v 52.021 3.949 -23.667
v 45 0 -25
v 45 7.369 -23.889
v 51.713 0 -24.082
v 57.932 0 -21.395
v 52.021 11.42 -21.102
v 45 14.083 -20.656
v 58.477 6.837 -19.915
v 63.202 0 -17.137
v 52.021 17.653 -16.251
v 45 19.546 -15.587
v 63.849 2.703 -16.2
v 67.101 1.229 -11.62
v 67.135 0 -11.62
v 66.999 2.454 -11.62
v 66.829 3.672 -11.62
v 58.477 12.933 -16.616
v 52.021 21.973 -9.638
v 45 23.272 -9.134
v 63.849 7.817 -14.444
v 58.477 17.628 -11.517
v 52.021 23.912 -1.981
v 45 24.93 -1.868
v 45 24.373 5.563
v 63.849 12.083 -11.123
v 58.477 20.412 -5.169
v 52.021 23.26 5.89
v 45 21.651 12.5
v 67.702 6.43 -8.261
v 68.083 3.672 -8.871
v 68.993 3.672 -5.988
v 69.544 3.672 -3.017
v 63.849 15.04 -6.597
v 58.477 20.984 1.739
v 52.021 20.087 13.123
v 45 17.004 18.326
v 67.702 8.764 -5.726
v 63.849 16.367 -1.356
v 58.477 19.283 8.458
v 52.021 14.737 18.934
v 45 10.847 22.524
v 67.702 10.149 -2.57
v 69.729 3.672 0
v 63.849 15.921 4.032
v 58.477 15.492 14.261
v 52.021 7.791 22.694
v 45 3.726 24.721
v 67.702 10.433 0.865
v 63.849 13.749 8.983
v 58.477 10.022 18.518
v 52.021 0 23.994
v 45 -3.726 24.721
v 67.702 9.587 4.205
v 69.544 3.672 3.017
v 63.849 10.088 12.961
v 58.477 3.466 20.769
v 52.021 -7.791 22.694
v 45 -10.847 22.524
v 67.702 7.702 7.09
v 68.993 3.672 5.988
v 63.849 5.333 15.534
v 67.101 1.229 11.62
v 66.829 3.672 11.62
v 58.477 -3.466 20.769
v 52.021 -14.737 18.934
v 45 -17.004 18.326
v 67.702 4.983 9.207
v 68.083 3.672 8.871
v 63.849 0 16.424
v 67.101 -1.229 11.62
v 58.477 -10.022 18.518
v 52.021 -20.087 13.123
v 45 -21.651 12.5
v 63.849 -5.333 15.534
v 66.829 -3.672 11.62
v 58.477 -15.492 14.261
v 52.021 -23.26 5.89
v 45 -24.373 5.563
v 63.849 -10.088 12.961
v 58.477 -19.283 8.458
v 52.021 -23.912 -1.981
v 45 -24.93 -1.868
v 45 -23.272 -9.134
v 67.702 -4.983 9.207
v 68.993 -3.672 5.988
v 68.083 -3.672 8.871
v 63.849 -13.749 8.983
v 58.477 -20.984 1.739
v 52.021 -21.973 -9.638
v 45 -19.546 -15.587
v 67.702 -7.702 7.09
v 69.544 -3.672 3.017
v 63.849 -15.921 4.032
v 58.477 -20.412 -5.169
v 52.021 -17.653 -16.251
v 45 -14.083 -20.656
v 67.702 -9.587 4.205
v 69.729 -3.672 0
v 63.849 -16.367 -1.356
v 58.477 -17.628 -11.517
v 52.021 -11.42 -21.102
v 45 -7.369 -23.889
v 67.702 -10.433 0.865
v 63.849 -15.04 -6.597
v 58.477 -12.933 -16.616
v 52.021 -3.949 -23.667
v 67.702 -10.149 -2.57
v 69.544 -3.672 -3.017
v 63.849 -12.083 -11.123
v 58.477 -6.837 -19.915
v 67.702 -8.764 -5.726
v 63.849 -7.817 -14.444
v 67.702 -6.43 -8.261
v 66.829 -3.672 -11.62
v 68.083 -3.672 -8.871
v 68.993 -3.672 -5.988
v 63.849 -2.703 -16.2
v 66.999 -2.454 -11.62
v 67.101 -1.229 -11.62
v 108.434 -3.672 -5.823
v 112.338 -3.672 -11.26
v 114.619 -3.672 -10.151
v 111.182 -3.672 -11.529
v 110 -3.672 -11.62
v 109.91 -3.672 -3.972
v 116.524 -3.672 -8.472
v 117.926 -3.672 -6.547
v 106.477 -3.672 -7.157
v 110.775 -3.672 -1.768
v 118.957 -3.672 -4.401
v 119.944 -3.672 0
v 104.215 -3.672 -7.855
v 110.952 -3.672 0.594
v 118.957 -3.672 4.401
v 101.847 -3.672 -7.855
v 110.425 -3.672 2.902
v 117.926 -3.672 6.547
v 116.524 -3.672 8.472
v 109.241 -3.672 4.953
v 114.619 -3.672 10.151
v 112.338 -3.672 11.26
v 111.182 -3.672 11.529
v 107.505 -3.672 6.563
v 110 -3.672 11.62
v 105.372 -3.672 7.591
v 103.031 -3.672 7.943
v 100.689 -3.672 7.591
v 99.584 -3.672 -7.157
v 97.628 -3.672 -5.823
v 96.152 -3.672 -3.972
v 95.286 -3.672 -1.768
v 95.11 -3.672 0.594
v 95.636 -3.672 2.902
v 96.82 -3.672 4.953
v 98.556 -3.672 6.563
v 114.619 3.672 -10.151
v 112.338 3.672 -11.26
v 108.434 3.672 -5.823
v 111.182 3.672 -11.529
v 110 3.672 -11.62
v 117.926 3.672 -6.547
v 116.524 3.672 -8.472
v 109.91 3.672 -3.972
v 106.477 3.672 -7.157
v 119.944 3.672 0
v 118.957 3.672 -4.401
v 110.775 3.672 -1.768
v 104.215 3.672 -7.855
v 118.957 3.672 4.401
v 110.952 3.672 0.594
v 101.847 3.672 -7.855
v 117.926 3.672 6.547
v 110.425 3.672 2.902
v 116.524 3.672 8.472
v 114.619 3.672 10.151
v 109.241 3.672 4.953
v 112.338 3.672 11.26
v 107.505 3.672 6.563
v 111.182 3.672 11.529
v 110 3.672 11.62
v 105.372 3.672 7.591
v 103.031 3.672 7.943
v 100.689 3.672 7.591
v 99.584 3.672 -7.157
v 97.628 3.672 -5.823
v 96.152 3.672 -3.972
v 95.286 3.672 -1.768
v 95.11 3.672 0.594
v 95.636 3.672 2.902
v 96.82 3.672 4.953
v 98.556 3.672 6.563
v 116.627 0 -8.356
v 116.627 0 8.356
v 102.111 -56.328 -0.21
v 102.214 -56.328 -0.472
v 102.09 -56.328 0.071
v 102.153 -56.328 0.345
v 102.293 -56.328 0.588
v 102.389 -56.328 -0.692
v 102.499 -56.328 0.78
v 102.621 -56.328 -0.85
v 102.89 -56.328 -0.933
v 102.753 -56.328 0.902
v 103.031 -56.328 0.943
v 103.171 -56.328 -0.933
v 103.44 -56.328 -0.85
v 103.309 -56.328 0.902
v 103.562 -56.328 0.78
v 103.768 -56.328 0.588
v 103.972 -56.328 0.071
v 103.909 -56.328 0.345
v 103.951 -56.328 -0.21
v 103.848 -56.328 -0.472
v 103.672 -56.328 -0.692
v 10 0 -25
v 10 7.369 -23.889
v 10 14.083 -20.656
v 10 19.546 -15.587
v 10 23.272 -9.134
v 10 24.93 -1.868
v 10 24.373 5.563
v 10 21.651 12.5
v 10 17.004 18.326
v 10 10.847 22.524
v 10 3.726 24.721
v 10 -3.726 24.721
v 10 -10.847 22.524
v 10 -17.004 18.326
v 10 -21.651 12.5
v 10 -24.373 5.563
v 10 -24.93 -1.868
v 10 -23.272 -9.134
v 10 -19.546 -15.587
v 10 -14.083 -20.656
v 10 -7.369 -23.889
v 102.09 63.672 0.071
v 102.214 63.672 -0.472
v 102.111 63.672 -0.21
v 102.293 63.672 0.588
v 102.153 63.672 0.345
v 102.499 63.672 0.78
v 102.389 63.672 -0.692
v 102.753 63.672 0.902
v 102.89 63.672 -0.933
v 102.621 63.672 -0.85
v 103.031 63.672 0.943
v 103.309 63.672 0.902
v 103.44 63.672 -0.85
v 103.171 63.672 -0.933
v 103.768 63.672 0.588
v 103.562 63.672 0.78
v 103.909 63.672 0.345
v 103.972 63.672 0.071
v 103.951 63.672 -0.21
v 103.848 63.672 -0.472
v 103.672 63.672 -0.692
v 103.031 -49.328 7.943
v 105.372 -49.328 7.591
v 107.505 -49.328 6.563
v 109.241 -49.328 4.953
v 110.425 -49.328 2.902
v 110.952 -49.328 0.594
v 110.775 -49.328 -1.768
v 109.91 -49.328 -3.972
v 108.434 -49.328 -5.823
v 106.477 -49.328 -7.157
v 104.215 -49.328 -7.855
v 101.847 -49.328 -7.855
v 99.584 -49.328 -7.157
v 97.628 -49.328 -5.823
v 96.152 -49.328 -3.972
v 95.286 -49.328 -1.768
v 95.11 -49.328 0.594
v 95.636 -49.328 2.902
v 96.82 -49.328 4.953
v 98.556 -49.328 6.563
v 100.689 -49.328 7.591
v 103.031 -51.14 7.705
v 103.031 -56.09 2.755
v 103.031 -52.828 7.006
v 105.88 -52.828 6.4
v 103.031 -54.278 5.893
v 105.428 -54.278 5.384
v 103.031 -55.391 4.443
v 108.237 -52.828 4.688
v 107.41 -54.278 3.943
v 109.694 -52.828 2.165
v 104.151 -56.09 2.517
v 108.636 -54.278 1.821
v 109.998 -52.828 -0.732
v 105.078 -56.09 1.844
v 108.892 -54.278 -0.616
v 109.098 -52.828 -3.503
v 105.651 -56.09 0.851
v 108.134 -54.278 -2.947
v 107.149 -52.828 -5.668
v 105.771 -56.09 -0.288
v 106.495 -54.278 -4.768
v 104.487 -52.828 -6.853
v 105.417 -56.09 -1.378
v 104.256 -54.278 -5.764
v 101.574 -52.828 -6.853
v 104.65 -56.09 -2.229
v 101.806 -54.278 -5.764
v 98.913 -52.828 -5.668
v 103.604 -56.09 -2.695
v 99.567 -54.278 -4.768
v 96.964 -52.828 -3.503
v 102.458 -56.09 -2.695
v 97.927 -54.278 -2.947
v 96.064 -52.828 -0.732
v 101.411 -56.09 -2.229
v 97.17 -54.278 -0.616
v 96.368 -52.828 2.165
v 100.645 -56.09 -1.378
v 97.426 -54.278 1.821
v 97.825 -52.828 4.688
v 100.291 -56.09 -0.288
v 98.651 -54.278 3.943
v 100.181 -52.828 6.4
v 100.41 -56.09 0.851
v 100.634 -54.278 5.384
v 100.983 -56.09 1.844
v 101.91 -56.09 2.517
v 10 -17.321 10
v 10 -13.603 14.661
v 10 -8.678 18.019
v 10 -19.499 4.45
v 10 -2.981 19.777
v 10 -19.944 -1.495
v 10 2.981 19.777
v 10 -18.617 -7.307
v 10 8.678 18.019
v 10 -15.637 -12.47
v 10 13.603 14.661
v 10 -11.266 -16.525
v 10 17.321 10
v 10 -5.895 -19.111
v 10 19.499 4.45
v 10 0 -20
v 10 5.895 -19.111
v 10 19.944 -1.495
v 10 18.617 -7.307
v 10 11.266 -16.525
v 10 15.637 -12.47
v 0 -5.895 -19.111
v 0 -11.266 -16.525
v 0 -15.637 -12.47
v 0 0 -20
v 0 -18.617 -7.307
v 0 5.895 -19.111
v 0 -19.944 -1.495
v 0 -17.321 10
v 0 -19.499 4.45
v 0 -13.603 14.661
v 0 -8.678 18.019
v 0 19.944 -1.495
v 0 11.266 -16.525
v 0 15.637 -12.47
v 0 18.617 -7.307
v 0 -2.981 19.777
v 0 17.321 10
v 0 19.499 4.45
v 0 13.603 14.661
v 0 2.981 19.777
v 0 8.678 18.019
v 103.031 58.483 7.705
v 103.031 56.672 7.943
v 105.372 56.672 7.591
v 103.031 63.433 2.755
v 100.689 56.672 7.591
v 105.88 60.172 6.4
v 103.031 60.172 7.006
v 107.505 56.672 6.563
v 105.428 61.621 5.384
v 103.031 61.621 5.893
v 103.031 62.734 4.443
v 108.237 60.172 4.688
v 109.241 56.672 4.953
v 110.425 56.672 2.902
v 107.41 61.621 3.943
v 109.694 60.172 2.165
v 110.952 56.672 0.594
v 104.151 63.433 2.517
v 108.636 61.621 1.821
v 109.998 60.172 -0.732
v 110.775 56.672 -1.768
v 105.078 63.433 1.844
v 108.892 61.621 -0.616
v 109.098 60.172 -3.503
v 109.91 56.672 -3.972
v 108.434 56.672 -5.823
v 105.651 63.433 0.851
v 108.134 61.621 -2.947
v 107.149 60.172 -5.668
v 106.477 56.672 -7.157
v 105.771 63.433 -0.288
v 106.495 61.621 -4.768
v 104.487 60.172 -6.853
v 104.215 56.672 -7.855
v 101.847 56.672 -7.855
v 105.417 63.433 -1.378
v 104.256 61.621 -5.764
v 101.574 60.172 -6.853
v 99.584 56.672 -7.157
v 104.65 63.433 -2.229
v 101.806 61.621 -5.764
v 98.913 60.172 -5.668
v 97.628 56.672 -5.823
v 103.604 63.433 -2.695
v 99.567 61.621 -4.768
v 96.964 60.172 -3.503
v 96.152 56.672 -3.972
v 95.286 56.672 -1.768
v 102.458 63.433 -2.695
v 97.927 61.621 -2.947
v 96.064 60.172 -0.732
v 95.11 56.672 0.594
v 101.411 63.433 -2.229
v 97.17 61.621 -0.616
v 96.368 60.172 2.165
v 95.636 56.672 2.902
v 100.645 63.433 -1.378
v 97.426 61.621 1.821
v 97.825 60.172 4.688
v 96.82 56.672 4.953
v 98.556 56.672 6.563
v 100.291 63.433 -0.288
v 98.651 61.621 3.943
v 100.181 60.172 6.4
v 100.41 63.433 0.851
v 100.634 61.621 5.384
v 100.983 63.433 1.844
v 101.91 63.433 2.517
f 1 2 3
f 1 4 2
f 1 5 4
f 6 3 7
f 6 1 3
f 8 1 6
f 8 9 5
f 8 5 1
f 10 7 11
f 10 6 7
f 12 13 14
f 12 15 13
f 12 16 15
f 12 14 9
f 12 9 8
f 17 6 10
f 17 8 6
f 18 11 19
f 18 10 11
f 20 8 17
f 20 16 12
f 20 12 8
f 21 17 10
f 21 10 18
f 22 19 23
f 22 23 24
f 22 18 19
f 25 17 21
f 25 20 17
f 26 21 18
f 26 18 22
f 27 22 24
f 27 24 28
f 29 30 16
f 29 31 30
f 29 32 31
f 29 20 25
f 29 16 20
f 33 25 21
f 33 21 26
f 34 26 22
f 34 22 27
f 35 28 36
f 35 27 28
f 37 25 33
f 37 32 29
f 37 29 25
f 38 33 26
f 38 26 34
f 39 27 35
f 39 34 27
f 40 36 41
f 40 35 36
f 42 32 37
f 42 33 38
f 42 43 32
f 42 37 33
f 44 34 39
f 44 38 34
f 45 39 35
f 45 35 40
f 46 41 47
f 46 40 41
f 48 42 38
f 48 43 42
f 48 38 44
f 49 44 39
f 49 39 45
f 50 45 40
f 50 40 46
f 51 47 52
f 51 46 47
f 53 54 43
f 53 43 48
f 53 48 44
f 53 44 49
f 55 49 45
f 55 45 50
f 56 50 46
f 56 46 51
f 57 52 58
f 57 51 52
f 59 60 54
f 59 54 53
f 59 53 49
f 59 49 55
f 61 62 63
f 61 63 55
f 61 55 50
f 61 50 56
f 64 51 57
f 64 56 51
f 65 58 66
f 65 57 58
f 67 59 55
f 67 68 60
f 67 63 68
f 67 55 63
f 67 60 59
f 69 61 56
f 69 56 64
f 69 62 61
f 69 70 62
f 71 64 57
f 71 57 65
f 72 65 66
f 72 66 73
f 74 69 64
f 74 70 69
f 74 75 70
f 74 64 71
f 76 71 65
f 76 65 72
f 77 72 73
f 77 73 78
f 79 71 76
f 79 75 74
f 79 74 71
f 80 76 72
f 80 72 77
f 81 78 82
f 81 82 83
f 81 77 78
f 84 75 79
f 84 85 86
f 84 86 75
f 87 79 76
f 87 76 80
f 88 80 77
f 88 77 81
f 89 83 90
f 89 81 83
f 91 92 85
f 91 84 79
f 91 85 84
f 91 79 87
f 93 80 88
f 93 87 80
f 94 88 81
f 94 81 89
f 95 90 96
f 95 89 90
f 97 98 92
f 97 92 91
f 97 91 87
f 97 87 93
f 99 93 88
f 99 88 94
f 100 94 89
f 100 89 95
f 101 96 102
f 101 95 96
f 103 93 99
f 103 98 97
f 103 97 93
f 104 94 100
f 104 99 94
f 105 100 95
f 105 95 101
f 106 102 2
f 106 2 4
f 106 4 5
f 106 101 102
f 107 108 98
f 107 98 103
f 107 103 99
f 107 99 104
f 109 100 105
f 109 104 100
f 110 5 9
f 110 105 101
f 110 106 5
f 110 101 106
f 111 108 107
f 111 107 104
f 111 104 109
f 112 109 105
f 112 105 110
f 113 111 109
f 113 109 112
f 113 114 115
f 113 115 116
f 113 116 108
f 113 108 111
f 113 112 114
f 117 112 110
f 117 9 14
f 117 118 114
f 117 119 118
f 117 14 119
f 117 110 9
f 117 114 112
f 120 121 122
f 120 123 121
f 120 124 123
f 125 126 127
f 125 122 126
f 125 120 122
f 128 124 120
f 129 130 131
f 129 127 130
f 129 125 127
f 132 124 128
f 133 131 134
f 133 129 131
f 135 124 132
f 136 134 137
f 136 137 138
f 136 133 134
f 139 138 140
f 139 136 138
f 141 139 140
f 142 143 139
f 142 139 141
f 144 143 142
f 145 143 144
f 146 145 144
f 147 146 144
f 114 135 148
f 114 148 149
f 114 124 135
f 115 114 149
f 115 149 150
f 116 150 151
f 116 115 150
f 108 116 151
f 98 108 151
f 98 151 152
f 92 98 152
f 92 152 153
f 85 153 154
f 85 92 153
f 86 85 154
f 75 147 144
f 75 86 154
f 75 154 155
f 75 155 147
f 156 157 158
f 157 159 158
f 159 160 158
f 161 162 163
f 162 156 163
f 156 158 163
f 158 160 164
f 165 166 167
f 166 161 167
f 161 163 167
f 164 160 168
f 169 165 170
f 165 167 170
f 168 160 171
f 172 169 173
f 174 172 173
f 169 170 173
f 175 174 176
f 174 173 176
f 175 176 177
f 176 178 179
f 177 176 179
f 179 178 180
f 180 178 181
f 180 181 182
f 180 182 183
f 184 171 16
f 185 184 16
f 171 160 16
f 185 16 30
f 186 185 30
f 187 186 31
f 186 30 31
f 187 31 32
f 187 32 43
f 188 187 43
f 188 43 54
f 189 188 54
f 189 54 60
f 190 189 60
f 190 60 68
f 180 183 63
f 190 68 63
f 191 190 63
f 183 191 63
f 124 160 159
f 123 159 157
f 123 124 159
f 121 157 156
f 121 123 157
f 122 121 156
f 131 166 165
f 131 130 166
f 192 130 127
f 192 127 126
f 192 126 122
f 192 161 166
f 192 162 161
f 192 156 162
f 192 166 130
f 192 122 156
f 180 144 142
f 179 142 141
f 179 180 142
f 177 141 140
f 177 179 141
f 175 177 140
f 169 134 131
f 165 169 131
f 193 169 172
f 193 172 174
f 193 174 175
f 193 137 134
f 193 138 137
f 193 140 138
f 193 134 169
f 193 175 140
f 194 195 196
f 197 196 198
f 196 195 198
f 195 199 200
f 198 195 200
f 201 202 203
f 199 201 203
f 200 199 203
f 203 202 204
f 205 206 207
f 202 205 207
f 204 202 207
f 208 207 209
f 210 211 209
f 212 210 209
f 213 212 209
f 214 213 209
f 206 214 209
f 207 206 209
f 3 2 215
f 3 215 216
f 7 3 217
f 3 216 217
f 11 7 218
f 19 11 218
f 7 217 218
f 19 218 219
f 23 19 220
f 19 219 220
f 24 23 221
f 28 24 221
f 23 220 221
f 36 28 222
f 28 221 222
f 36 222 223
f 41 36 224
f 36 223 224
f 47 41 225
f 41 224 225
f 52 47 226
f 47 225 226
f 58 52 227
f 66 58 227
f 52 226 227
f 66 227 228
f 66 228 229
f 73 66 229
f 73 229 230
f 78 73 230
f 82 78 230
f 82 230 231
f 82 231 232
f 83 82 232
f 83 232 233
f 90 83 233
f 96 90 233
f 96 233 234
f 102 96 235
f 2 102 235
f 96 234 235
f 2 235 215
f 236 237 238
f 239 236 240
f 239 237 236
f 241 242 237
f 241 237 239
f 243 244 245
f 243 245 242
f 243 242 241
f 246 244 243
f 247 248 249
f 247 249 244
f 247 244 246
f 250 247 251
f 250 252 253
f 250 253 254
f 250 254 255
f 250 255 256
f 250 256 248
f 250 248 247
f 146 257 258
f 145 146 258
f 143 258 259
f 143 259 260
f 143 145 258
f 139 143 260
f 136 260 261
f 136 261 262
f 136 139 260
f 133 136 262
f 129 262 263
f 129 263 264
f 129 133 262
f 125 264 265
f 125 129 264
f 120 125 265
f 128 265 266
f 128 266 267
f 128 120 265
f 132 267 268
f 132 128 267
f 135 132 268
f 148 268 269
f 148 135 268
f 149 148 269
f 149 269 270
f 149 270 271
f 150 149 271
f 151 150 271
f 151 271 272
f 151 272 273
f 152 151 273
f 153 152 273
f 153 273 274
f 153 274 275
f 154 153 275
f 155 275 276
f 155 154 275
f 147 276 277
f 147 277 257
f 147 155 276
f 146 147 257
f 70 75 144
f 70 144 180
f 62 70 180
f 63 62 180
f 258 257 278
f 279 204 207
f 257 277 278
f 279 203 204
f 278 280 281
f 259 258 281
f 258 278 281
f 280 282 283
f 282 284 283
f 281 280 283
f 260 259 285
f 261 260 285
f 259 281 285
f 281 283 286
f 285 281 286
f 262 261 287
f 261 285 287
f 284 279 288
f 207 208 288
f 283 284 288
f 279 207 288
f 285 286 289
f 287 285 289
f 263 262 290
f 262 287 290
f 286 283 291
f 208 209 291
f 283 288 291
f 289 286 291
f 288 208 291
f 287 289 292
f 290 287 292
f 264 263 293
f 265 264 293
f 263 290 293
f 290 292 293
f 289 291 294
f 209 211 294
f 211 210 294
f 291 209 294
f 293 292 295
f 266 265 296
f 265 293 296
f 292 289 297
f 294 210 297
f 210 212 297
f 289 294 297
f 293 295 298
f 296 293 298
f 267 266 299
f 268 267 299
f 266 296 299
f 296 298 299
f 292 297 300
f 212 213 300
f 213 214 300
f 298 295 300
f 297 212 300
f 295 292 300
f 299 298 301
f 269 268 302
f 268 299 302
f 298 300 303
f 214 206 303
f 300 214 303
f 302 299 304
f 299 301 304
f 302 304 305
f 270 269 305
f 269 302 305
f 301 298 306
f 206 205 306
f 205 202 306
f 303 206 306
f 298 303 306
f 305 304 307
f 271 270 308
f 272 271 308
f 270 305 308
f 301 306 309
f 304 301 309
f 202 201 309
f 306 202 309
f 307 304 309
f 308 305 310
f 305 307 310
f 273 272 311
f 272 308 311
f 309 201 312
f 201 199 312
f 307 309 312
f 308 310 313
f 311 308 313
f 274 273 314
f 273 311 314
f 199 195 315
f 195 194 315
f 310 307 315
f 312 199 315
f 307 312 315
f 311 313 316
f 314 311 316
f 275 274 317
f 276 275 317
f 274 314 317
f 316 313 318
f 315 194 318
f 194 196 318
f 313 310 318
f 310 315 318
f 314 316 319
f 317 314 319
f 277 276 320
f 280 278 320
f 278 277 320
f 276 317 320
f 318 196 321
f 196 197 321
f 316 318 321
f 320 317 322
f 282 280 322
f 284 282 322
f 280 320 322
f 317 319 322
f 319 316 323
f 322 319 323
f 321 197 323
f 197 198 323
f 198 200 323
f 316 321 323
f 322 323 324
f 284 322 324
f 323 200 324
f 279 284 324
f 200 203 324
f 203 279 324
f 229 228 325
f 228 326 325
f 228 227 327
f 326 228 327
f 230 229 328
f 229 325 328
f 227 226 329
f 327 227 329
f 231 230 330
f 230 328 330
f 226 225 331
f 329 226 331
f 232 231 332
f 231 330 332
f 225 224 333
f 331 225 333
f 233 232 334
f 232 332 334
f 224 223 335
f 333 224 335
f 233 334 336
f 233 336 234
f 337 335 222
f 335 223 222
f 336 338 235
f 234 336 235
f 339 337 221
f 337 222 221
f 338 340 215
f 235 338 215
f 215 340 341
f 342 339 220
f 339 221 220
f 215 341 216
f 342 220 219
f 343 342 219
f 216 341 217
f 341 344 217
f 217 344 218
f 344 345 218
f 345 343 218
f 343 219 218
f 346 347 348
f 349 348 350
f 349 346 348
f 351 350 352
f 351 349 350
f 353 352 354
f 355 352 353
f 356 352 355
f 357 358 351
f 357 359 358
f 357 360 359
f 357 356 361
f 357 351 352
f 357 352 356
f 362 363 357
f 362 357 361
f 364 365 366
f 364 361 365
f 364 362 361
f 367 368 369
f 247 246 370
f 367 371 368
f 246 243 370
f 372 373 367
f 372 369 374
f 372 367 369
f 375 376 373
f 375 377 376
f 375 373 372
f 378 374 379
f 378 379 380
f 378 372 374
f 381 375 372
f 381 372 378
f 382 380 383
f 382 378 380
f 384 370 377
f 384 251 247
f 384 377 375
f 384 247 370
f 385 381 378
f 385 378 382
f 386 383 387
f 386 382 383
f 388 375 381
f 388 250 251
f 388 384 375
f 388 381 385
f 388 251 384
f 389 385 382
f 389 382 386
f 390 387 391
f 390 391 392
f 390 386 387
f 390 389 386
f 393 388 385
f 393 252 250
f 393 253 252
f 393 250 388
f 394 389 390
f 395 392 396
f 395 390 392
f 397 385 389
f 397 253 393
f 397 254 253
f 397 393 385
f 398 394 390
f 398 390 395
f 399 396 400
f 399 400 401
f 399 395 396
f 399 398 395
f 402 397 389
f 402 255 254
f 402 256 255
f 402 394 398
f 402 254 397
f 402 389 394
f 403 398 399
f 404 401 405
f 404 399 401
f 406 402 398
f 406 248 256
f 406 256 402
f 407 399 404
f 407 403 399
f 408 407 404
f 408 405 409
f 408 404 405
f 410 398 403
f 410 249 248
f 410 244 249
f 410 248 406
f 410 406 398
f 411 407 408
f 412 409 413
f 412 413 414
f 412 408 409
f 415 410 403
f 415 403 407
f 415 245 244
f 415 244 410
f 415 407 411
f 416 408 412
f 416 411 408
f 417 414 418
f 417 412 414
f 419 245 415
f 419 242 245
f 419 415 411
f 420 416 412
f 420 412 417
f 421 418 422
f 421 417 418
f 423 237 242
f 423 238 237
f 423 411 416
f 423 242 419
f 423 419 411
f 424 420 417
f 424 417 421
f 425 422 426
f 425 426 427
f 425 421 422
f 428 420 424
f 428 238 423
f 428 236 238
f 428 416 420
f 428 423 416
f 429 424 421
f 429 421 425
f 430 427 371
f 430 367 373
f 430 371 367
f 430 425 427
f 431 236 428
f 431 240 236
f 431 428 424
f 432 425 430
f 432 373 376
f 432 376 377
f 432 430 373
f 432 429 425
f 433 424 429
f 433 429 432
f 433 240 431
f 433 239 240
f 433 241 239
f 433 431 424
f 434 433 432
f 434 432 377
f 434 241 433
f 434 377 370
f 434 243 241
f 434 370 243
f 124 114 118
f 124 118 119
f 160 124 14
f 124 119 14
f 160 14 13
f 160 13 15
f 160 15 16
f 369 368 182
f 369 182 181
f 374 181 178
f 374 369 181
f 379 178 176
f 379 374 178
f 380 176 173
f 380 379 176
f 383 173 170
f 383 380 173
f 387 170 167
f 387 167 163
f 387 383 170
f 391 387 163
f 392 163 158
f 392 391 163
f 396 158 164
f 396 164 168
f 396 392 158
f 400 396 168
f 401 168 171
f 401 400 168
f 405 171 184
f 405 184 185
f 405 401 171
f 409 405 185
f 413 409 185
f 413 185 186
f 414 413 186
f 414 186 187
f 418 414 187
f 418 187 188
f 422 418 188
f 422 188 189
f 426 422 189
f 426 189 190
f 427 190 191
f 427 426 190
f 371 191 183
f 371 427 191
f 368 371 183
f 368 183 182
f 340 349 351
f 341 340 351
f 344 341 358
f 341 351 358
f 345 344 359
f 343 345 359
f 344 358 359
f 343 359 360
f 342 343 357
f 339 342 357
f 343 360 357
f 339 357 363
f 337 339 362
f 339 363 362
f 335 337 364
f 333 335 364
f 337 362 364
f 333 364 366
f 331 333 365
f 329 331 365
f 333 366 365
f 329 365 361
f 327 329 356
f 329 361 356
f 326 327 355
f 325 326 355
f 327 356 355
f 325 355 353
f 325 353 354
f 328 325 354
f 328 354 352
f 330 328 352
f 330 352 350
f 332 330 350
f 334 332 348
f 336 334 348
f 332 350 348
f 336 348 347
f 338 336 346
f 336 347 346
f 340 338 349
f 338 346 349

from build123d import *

# Parameters (mm, degrees)
SKETCH1_R           = 20
BOSS_EXTRUDE1_DEPTH = 10
SKETCH2_R           = 25
BOSS_EXTRUDE2_DEPTH = 60
FILLET1_R           = 25
SKETCH3_W           = 23.240720894
SKETCH3_H           = 7.34315937
BOSS_EXTRUDE3_DEPTH = 120
SKETCH4_R           = 7.943437771
BOSS_EXTRUDE4_DEPTH = 60
FILLET2_R           = 7
FILLET3_R           = 7
FILLET4_SIZE        = 10
FILLET4_SIZE_2      = 13


with BuildPart() as part:
    # Sketch1 → Boss-Extrude1 (new body)
    with BuildSketch(Plane(origin=(0, 0, 0), x_dir=(0, 0, -1), z_dir=(1, 0, 0))):
        Circle(SKETCH1_R)
    extrude(amount=BOSS_EXTRUDE1_DEPTH)

    # Sketch2 → Boss-Extrude2 (add)
    with BuildSketch(Plane(origin=(10, 0, 0), x_dir=(0, 0, -1), z_dir=(1, 0, 0))):
        Circle(SKETCH2_R)
    extrude(amount=BOSS_EXTRUDE2_DEPTH)

    # Fillet1
    fillet1_edges = [part.edges().sort_by_distance(p)[0] for p in [
        (70, 0, 25),
    ]]
    fillet(fillet1_edges, radius=FILLET1_R)

    # Sketch3 → Boss-Extrude3 (add)
    with BuildSketch(Plane.ZY):
        Rectangle(SKETCH3_W, SKETCH3_H)
    extrude(amount=-BOSS_EXTRUDE3_DEPTH)

    # Sketch4 → Boss-Extrude4 (add, symmetric)
    with BuildSketch(Plane(origin=(0, 3.671579685, 0), x_dir=(1, 0, 0), z_dir=(0, 1, 0))):
        with Locations(Location((103.030776269, 0, 0), (0, 0, 270))):
            Circle(SKETCH4_R)
    extrude(amount=BOSS_EXTRUDE4_DEPTH, both=True)

    # Fillet2
    fillet2_edges = [part.edges().sort_by_distance(p)[0] for p in [
        (103.030776269, 63.671579685, -7.943437771),
    ]]
    fillet(fillet2_edges, radius=FILLET2_R)

    # Fillet3
    fillet3_edges = [part.edges().sort_by_distance(p)[0] for p in [
        (103.030776269, -56.328420315, -7.943437771),
    ]]
    fillet(fillet3_edges, radius=FILLET3_R)

    # Fillet4
    # an asymmetric fillet: 13, 10 mm, written as the material it takes off along each edge
    with BuildSketch(Plane(origin=(120, -36.171579685, -11.620360447), x_dir=(-1, 0, 0), z_dir=(0, 1, 0)), Plane(origin=(120, 36.171579685, 11.620360447), x_dir=(-1, 0, 0), z_dir=(0, -1, 0))) as fillet4_piece_1:
        with BuildLine():
            Bezier((FILLET4_SIZE, 0), (0, 0), (0, FILLET4_SIZE_2), weights=[1, 0.707106781, 1])
            Line((0, FILLET4_SIZE_2), (0, 0))
            Line((0, 0), (FILLET4_SIZE, 0))
        make_face()
    extrude(amount=72.34315937, mode=Mode.SUBTRACT)


solid = part.part
